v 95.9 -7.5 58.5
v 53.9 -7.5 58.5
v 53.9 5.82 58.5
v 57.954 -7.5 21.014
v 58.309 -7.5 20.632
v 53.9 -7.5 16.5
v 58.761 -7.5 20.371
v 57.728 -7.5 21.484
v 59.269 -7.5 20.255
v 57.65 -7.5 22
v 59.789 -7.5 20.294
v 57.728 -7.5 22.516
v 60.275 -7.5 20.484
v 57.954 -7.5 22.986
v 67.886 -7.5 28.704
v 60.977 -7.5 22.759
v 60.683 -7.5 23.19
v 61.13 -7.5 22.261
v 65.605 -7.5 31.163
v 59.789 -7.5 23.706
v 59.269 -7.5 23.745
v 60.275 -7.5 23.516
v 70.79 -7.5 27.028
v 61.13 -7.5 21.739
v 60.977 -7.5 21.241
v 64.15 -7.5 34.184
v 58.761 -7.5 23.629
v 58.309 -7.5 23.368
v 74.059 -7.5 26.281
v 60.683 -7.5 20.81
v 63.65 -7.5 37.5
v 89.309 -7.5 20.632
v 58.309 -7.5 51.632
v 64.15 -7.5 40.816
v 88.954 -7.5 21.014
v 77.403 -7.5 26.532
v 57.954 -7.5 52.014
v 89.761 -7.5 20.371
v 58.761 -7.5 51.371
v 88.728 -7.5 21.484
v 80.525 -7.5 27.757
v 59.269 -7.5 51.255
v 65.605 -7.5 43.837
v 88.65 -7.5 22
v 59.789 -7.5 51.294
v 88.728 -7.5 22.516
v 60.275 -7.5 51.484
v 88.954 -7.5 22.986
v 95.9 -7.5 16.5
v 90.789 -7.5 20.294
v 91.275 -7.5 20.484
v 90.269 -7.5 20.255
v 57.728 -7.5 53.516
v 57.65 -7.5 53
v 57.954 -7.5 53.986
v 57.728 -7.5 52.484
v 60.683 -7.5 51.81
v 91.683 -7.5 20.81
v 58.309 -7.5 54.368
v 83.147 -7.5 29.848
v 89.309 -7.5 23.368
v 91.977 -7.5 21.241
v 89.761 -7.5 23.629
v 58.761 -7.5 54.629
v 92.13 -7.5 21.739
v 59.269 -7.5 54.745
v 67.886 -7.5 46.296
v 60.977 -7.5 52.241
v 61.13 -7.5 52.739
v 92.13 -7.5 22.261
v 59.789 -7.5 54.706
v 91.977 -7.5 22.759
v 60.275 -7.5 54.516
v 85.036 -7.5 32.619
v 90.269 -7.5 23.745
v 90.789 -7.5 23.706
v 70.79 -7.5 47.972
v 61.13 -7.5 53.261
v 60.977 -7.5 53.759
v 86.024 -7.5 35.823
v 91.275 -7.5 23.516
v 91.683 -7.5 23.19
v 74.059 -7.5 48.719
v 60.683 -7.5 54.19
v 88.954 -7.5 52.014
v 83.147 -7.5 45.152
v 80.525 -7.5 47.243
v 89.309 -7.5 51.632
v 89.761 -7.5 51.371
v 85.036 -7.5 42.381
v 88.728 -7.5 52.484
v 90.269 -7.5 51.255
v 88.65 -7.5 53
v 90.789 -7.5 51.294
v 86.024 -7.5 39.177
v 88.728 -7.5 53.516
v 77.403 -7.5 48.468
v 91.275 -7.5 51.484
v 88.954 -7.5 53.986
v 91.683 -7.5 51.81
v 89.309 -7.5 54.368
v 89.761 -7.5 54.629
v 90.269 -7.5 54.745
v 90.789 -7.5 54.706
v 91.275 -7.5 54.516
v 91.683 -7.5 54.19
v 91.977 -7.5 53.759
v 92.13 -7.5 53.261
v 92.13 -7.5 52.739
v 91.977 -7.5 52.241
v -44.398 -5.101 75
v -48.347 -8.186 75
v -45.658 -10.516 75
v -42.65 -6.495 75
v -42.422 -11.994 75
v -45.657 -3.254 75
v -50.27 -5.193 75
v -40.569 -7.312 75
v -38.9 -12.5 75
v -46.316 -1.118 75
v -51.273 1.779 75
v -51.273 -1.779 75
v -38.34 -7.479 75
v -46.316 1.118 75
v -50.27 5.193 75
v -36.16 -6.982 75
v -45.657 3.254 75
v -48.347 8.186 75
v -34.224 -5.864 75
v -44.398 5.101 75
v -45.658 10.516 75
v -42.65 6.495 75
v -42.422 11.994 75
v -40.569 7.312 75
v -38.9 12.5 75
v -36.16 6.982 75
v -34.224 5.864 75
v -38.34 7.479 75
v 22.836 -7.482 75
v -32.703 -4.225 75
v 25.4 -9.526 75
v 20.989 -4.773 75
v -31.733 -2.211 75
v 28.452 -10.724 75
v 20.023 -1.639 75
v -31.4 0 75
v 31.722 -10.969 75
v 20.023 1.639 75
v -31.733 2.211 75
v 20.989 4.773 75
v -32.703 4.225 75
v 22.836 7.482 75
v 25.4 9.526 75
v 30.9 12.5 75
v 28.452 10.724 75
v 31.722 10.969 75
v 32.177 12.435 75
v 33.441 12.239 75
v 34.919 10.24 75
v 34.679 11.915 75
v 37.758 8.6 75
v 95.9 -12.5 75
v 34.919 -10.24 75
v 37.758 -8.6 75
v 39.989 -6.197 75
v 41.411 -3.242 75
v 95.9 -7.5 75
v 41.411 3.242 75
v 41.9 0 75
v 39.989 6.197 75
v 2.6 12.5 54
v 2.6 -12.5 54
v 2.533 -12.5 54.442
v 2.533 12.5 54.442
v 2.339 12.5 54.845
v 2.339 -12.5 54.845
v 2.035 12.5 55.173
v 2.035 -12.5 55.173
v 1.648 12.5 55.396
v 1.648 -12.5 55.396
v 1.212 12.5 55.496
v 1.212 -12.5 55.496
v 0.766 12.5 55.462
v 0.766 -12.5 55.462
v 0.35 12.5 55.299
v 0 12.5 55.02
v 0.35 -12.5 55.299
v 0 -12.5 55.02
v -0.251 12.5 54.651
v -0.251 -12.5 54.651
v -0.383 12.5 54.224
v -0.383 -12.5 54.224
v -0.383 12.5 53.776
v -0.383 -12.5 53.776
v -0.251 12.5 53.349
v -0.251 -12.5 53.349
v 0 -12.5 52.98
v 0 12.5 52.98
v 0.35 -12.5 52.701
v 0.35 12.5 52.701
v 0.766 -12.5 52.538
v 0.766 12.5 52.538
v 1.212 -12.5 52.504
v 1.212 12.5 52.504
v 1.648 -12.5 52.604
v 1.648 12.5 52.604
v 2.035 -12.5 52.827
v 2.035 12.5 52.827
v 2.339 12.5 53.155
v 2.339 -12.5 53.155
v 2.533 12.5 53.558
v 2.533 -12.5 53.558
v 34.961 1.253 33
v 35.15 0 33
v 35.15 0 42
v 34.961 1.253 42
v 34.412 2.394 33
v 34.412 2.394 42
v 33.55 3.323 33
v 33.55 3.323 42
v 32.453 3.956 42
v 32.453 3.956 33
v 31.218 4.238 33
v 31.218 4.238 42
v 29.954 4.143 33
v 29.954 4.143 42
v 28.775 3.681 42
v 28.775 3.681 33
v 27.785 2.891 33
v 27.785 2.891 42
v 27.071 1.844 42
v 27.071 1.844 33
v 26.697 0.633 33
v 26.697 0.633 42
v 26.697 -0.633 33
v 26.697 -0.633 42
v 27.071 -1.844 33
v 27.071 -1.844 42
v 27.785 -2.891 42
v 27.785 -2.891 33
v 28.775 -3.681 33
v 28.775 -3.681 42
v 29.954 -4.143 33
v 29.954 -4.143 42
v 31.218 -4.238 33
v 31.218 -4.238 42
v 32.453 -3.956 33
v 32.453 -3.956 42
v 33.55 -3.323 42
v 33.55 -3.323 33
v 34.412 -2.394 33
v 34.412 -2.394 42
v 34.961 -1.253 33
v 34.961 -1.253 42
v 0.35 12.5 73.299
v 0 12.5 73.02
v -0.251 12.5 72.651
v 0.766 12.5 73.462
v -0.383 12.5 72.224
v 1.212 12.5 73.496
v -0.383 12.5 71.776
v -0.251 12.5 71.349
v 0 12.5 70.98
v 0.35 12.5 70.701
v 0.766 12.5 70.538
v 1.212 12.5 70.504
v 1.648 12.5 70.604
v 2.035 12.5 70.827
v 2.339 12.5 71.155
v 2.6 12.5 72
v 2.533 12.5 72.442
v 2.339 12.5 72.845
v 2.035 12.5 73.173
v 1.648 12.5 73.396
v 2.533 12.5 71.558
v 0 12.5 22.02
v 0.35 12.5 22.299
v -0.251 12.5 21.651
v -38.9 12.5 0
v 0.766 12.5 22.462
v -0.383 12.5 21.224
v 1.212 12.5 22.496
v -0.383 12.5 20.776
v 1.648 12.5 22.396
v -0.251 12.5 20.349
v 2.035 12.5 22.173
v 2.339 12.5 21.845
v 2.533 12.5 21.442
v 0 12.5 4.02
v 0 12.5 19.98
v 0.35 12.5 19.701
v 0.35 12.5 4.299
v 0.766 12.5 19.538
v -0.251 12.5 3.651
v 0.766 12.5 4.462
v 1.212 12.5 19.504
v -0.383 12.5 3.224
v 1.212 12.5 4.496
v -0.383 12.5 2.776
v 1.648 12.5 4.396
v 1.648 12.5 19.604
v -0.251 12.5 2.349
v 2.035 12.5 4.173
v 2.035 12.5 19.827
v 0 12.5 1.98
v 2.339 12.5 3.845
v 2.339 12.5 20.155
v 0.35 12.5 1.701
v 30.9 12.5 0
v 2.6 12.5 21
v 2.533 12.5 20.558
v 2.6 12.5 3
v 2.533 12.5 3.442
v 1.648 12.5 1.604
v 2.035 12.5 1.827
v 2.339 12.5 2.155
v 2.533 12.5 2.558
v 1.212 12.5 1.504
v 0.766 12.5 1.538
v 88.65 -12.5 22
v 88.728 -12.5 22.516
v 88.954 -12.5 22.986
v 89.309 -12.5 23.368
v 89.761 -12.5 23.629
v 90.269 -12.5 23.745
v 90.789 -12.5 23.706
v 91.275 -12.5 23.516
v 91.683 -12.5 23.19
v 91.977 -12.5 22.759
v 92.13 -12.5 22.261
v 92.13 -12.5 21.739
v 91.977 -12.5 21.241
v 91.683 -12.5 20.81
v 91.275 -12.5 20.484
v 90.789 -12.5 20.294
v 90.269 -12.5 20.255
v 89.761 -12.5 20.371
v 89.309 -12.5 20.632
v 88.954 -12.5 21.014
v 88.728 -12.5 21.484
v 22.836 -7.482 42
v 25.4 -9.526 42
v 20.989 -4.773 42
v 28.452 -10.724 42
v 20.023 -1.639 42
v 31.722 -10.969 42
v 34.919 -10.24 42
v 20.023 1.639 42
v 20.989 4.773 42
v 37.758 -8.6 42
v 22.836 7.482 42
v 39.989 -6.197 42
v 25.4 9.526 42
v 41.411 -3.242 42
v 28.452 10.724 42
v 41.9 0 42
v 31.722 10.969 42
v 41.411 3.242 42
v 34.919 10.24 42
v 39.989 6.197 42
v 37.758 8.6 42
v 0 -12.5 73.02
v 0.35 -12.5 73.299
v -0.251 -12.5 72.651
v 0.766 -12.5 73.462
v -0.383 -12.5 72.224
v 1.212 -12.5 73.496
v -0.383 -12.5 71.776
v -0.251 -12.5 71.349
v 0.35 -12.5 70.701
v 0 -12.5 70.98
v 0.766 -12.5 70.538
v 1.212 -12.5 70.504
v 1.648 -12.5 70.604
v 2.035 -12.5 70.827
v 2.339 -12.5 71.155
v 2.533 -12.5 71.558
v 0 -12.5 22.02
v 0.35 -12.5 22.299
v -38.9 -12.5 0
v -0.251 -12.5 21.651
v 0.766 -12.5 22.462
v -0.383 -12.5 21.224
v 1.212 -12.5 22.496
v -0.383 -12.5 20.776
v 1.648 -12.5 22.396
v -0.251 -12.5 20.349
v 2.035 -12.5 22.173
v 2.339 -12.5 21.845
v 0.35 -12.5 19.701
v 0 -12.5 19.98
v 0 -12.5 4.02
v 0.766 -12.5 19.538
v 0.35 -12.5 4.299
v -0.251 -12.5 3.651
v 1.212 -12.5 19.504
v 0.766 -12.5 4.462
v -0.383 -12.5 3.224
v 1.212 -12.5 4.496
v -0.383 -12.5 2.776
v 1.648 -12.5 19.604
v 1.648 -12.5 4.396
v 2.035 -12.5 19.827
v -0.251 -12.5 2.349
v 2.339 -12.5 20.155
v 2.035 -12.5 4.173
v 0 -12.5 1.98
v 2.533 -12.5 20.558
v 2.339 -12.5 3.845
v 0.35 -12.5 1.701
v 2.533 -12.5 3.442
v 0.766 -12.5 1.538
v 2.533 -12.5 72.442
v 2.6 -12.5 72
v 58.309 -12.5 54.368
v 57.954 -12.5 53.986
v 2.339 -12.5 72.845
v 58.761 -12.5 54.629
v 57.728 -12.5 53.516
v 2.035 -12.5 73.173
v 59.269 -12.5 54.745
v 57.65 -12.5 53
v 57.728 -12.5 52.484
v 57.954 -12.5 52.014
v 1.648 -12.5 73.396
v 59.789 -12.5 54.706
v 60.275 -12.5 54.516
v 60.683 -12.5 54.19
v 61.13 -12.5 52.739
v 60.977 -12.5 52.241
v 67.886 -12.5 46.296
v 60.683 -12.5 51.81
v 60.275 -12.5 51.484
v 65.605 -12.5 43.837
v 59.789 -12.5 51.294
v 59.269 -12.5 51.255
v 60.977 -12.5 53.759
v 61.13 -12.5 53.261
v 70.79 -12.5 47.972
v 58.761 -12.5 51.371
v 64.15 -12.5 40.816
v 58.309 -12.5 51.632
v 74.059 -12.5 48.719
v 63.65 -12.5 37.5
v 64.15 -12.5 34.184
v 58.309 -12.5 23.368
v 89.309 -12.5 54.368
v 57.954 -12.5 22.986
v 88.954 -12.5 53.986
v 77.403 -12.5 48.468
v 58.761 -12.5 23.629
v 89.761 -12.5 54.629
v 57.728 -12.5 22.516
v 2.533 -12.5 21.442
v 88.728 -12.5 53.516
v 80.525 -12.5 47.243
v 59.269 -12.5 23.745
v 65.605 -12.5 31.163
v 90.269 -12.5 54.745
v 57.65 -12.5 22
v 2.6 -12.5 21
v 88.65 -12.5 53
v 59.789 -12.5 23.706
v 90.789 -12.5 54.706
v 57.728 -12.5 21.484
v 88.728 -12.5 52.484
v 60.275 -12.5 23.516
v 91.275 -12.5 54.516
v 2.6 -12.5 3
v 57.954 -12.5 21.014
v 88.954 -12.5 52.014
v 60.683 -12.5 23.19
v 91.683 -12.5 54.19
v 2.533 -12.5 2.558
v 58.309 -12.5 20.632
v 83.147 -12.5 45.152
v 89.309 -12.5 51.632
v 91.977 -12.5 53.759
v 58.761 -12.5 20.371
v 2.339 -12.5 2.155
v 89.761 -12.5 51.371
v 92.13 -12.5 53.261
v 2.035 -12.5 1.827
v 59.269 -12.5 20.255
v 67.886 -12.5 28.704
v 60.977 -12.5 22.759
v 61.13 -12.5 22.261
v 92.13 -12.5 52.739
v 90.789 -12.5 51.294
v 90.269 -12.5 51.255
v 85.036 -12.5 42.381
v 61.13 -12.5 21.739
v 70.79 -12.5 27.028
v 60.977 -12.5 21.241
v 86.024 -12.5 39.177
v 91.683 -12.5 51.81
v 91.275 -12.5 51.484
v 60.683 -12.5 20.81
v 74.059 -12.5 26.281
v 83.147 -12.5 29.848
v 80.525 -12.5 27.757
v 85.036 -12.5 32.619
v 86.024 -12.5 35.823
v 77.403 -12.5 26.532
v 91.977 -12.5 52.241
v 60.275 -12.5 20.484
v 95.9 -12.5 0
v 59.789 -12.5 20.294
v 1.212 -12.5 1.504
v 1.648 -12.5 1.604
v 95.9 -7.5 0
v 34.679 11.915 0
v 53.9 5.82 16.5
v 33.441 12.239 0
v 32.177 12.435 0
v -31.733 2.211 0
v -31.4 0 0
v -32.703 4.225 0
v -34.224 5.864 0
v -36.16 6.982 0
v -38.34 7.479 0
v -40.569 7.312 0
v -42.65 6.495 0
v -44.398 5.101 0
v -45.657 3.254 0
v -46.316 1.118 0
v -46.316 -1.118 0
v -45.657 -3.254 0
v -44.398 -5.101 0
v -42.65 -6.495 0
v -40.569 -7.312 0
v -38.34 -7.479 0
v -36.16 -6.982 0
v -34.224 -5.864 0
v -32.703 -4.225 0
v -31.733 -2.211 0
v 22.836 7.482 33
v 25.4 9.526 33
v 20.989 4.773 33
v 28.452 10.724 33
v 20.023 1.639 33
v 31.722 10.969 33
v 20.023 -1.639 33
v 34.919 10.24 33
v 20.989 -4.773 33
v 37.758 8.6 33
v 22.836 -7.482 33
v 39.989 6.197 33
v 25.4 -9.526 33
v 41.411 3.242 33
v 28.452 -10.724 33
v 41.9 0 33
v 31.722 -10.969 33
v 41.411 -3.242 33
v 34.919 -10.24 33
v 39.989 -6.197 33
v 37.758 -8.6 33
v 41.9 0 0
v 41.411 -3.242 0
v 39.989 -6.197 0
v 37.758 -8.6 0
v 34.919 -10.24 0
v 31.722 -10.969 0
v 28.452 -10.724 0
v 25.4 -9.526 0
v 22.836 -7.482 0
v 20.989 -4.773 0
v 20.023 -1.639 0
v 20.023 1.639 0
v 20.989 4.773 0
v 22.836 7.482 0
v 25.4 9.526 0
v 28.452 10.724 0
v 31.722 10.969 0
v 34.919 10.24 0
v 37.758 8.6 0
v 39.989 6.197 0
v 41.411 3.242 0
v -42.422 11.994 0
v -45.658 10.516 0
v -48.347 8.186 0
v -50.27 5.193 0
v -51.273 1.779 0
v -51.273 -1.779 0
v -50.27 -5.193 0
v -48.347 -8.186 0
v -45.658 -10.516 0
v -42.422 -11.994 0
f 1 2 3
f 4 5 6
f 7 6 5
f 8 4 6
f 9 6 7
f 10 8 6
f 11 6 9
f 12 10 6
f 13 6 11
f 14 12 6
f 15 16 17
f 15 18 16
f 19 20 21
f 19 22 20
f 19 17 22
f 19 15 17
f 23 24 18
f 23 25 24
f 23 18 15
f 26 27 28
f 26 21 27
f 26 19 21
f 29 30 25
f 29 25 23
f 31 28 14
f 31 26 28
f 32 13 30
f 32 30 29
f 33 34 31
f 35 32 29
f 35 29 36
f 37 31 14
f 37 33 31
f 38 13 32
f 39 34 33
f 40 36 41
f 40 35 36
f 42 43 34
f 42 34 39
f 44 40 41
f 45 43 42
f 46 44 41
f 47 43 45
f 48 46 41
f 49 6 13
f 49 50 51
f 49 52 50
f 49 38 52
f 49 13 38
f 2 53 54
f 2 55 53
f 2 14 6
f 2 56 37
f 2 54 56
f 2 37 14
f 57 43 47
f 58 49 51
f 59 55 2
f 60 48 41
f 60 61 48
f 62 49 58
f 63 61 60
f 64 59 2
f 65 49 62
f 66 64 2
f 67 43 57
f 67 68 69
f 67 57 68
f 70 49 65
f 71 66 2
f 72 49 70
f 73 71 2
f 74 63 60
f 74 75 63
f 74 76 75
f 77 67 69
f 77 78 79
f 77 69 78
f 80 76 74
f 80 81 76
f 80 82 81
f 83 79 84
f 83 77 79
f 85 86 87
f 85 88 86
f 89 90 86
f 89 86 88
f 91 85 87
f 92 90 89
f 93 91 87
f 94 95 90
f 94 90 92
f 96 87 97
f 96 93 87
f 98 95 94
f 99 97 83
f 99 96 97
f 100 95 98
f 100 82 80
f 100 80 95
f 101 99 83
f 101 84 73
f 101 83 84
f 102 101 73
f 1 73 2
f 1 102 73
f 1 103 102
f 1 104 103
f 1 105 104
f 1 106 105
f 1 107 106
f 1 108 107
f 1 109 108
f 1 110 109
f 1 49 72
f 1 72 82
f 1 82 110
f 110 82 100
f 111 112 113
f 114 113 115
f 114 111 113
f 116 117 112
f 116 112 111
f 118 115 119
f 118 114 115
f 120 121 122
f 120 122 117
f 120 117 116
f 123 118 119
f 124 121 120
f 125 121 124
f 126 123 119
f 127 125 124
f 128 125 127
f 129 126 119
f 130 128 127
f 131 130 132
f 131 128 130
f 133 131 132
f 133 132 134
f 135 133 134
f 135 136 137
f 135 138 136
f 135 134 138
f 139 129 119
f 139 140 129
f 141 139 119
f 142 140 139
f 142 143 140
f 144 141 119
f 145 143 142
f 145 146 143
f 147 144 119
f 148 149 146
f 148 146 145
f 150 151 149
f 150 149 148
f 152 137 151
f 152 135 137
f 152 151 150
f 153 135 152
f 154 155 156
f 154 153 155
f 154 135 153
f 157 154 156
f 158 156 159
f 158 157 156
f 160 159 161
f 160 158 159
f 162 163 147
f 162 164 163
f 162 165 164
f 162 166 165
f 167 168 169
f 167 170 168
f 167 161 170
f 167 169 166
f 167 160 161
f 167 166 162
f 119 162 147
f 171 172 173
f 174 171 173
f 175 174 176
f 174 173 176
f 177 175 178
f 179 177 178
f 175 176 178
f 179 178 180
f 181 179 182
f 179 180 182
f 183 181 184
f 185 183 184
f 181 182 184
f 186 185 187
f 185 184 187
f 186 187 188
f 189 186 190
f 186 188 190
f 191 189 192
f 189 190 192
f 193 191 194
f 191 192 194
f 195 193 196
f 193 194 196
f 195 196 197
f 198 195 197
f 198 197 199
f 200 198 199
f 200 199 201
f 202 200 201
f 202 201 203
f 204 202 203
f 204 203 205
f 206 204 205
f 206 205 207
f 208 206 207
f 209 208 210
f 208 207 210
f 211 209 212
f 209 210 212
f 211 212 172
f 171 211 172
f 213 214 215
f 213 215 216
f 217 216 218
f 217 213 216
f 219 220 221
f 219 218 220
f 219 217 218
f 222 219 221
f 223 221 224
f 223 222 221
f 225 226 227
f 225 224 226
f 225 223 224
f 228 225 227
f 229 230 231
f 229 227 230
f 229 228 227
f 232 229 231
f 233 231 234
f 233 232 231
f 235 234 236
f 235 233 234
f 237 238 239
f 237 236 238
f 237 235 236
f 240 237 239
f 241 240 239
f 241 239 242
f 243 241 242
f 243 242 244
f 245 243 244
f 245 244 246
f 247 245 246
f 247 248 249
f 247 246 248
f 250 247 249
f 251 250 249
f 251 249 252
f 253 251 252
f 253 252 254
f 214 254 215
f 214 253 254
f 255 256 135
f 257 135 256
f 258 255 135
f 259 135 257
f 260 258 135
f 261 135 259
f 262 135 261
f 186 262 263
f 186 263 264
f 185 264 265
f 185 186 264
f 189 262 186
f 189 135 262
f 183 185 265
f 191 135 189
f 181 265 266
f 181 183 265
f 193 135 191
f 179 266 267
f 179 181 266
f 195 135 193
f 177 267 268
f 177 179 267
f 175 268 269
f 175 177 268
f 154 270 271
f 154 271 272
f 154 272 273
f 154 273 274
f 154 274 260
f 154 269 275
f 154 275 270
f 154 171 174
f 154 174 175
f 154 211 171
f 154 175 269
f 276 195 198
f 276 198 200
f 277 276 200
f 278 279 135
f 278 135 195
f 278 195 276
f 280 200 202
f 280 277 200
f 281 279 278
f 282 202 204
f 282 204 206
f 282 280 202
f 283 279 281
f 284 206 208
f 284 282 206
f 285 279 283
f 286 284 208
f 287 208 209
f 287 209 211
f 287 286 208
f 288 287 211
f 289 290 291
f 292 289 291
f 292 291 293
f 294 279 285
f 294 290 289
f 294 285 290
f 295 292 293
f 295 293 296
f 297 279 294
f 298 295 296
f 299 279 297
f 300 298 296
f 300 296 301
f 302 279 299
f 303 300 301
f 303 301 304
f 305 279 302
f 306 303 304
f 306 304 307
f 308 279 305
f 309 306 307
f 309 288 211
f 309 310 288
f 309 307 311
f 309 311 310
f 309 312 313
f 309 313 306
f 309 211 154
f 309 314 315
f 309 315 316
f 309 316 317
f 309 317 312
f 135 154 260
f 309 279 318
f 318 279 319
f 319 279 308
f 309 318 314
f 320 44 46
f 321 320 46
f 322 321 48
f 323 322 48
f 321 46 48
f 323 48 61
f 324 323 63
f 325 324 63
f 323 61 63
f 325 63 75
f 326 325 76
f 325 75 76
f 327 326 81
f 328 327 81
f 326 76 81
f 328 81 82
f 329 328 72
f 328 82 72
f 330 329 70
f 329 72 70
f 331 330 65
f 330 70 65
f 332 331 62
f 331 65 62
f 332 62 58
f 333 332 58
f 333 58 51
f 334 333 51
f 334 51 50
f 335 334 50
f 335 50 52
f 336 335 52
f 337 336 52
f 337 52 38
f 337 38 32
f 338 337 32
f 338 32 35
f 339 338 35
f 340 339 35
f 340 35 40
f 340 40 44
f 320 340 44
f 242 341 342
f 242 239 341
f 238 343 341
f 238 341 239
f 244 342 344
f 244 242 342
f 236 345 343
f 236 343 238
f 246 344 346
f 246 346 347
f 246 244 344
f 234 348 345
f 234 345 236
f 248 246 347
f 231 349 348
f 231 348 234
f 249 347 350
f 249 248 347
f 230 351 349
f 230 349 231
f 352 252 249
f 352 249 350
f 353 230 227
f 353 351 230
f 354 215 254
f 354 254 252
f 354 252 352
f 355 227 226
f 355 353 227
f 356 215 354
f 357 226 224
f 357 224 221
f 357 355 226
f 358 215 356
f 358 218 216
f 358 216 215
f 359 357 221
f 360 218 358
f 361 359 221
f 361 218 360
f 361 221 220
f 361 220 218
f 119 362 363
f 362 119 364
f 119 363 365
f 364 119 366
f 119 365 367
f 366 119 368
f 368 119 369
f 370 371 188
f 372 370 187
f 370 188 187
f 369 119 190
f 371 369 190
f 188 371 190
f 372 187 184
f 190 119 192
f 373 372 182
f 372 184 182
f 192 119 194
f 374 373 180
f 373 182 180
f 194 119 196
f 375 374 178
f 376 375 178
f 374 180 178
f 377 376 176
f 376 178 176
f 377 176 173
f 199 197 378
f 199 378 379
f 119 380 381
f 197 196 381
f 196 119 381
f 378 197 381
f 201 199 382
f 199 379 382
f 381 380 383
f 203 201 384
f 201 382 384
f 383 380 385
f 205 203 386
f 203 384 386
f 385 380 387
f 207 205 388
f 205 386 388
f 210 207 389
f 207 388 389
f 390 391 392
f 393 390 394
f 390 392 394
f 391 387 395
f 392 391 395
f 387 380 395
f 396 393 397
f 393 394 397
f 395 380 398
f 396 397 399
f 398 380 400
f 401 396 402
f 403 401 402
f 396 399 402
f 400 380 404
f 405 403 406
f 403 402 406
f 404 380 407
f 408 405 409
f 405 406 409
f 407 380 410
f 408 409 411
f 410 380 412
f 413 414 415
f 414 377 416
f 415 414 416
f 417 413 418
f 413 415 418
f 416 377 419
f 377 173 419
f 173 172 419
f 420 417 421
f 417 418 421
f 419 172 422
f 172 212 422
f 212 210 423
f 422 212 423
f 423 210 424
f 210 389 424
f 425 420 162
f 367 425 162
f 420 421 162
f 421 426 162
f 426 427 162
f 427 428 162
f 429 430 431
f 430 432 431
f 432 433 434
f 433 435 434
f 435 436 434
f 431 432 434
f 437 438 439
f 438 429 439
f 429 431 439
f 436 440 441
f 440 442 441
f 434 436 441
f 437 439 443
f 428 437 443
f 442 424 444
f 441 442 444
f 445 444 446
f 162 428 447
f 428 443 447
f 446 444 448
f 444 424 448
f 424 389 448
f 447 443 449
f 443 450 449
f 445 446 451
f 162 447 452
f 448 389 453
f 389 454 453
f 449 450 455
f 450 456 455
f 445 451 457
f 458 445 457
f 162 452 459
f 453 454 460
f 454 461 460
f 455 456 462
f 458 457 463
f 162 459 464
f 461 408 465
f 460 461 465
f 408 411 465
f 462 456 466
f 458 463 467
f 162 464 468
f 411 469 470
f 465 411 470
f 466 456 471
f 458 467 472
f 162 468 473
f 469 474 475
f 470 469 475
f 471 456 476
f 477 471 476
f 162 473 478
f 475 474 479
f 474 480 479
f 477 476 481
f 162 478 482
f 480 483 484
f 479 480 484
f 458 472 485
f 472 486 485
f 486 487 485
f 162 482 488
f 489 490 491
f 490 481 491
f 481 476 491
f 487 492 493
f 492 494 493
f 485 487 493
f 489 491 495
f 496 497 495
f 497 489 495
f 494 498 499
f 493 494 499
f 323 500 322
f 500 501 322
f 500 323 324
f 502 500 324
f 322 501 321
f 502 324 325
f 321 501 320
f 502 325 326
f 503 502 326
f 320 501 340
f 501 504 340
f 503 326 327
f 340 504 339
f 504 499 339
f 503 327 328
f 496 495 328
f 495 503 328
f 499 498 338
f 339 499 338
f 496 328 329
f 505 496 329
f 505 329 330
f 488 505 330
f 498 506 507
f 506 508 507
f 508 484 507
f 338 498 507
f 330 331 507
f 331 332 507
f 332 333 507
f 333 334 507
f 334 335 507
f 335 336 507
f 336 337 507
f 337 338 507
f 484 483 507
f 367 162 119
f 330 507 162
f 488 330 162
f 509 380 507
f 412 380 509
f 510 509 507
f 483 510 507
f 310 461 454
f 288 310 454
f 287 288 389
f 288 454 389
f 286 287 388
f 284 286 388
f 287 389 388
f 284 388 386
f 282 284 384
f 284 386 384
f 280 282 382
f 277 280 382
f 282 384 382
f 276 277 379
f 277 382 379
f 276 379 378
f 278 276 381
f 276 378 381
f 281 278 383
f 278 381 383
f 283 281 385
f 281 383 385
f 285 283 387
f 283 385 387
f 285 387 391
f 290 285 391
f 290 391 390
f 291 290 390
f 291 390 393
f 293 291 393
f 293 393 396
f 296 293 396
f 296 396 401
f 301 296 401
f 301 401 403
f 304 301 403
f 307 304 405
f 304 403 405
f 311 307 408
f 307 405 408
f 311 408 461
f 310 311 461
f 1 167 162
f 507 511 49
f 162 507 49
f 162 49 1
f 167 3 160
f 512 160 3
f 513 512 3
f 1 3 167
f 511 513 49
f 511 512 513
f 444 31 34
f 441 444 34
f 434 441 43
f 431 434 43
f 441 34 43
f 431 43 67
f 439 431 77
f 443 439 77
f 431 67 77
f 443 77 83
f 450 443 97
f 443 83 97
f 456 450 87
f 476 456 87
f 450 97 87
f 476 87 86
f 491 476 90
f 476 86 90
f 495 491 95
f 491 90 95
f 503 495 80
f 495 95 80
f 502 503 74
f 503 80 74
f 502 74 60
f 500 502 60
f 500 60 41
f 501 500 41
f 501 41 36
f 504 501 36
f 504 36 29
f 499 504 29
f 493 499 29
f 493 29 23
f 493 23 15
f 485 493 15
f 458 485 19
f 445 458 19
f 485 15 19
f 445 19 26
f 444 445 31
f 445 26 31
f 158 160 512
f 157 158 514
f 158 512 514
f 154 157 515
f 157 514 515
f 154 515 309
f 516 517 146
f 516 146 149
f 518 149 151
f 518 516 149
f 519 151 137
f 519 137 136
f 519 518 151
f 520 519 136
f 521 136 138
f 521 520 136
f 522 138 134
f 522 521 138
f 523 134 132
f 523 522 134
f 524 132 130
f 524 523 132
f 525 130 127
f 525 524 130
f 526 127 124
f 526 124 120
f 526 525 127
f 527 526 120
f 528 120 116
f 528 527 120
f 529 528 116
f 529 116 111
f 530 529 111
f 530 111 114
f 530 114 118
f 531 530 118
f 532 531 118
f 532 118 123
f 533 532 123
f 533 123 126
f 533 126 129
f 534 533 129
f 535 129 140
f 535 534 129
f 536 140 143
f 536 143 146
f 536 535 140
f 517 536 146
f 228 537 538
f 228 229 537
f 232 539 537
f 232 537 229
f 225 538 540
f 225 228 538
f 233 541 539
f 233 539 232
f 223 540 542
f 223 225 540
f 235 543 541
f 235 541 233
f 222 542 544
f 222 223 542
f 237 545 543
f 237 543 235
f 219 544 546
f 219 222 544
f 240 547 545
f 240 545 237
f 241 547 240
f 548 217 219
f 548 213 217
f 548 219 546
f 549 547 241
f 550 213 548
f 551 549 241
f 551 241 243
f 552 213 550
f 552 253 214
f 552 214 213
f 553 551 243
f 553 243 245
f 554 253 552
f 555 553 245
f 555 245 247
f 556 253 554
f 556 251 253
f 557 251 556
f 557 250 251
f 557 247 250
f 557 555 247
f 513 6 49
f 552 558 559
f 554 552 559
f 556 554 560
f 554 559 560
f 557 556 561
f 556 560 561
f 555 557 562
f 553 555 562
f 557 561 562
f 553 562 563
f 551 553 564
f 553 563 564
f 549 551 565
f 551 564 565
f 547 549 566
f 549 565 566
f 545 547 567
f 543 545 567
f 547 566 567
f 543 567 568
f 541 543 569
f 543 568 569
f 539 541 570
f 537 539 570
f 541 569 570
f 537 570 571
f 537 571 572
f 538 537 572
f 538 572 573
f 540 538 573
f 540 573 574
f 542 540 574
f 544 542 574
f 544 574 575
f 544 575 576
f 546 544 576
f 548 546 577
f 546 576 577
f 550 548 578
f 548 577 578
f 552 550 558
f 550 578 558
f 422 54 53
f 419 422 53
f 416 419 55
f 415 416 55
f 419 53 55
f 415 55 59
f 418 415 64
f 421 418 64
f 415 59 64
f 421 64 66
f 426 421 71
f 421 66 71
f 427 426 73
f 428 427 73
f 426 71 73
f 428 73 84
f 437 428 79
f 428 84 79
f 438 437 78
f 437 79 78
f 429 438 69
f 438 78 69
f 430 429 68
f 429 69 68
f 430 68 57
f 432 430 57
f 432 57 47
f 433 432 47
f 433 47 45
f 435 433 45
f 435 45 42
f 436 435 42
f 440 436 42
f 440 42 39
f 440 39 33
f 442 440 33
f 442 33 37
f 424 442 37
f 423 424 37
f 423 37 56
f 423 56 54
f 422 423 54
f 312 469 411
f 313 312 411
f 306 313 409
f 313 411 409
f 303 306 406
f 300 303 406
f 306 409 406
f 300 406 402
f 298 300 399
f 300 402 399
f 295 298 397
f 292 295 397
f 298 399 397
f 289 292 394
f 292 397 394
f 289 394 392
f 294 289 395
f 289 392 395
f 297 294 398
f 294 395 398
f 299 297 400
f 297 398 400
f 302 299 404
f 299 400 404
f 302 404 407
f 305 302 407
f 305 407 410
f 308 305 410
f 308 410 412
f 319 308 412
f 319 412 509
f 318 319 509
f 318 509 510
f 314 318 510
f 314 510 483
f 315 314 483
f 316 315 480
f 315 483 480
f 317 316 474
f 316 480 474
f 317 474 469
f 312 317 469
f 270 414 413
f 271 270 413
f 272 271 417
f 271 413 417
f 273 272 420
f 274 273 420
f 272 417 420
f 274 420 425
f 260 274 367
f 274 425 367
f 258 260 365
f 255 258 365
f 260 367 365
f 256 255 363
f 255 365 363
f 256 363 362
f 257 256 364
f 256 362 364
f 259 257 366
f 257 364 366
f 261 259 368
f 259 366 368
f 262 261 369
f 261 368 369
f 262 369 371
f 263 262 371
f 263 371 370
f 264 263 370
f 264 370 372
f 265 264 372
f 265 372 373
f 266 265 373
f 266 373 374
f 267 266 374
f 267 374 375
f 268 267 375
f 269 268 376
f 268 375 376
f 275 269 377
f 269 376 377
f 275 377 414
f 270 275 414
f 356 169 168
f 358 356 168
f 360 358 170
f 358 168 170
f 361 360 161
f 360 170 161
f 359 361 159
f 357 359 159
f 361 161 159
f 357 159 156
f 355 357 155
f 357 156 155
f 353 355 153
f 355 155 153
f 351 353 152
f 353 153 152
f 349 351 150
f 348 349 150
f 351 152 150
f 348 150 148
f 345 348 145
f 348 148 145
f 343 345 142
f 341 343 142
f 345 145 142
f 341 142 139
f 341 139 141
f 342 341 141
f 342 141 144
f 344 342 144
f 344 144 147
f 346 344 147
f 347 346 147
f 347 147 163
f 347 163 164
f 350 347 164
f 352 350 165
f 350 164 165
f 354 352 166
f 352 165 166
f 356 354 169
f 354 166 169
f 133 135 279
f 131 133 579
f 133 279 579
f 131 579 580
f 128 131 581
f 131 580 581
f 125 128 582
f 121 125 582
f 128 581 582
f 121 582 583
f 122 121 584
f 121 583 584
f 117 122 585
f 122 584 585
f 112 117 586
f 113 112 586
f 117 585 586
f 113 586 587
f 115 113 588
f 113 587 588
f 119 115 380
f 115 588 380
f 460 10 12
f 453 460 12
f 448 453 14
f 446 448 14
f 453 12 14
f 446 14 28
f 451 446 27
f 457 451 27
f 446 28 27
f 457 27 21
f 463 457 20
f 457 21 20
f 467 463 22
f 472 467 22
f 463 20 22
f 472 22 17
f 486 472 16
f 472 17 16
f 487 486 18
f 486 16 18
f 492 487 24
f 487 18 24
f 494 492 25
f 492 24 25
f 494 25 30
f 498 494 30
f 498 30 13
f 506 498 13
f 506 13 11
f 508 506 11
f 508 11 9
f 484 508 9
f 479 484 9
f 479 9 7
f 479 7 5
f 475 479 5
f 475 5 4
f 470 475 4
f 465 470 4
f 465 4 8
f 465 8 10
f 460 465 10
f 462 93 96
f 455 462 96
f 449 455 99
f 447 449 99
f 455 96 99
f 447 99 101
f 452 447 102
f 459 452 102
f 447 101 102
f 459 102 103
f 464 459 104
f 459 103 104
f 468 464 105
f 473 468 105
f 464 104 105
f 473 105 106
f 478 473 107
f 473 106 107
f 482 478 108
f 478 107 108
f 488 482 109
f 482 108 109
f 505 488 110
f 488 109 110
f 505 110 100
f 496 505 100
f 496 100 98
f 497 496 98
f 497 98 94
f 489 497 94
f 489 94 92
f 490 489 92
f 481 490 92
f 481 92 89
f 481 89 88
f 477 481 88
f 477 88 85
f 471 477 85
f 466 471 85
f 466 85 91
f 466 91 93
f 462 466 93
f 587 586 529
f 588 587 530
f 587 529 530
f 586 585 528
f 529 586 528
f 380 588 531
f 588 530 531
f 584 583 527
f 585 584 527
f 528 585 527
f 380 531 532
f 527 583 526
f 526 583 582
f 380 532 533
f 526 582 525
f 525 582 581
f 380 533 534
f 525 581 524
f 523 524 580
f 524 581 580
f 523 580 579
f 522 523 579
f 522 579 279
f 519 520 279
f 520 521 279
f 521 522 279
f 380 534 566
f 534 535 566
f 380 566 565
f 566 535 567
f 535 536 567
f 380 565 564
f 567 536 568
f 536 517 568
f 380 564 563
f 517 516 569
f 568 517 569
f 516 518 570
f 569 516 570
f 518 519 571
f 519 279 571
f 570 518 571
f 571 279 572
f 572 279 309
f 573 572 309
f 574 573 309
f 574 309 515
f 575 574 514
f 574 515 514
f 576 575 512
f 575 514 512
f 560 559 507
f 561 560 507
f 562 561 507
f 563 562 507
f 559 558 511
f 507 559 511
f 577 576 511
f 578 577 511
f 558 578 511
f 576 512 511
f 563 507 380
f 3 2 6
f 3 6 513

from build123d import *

# Parameters (mm, degrees)
SKETCH_R        = 7.5
SKETCH_R_2      = 4.25
PAD_DEPTH       = 75
SKETCH001_W     = 19.415184
SKETCH001_H     = 42
POCKET_DEPTH    = 42
SKETCH002_R     = 11.25
POCKET001_DEPTH = 5
SKETCH003_R     = 1.75
HOLE_DEPTH      = 25
SKETCH004_R     = 1.5
HOLE001_DEPTH   = 25
HOLE001_TIPS_R  = 1.5
SKETCH005_R     = 11
POCKET002_DEPTH = 33
SKETCH006_R     = 11
POCKET003_DEPTH = 33


with BuildPart() as part:
    # Sketch → Pad (new body)
    with BuildSketch(Plane.XY):
        with BuildLine():
            ThreePointArc((-38.9, 12.5), (-51.4, 0), (-38.9, -12.5))
            Line((-38.9, -12.5), (30.9, -12.5))
            Line((95.9, -12.5), (30.9, -12.5))
            Line((95.9, -7.5), (95.9, -12.5))
            Line((34.678675, 11.915184), (95.9, -7.5))
            ThreePointArc((34.678675, 11.915184), (32.811831, 12.352931), (30.9, 12.5))
            Line((-38.9, 12.5), (30.9, 12.5))
        make_face()
        with Locations((-38.9, 0)):
            Circle(SKETCH_R, mode=Mode.SUBTRACT)
        with Locations((30.9, 0)):
            Circle(SKETCH_R_2, mode=Mode.SUBTRACT)
    extrude(amount=PAD_DEPTH)

    # Sketch001 (on Face3 of Pad) → Pocket (cut)
    with BuildSketch(Plane.YZ.offset(95.9)):
        with Locations((2.207592, 37.5)):
            Rectangle(SKETCH001_W, SKETCH001_H)
    extrude(amount=-POCKET_DEPTH, mode=Mode.SUBTRACT)

    # Sketch002 (on Face11 of Pocket) → Pocket001 (cut)
    with BuildSketch(Plane(origin=(0, -7.5, 0), x_dir=(-1, 0, 0), z_dir=(0, 1, 0))):
        with Locations((-74.9, 37.5)):
            Circle(SKETCH002_R)
    extrude(amount=-POCKET001_DEPTH, mode=Mode.SUBTRACT)

    # Sketch003 (on Face12 of Pocket001) → Hole (cut)
    with BuildSketch(Plane(origin=(0, -7.5, 0), x_dir=(-1, 0, 0), z_dir=(0, 1, 0))):
        with Locations((-90.4, 53)):
            Circle(SKETCH003_R)
        with Locations((-59.4, 53)):
            Circle(SKETCH003_R)
        with Locations((-59.4, 22)):
            Circle(SKETCH003_R)
        with Locations((-90.4, 22)):
            Circle(SKETCH003_R)
    extrude(amount=-HOLE_DEPTH, mode=Mode.SUBTRACT)

    # Sketch004 (on Face3 of Hole) → Hole001 (cut)
    with BuildSketch(Plane.XZ.offset(12.5)):
        with Locations((1.1, 72)):
            Circle(SKETCH004_R)
        with Locations((1.1, 54)):
            Circle(SKETCH004_R)
        with Locations((1.1, 21)):
            Circle(SKETCH004_R)
        with Locations((1.1, 3)):
            Circle(SKETCH004_R)
    extrude(amount=-HOLE001_DEPTH, mode=Mode.SUBTRACT)

    # Hole001 tips → Hole001 tip 1 section 0
    with BuildSketch(Plane.XZ.offset(-12.5), mode=Mode.PRIVATE) as hole001_tip_1_s0:
        with Locations((1.1, 72)):
            Circle(HOLE001_TIPS_R)
    loft([hole001_tip_1_s0.sketch, Vertex(1.1, 13.401291, 72)], mode=Mode.SUBTRACT)

    # Hole001 tips → Hole001 tip 2 section 0
    with BuildSketch(Plane.XZ.offset(-12.5), mode=Mode.PRIVATE) as hole001_tip_2_s0:
        with Locations((1.1, 54)):
            Circle(HOLE001_TIPS_R)
    loft([hole001_tip_2_s0.sketch, Vertex(1.1, 13.401291, 54)], mode=Mode.SUBTRACT)

    # Hole001 tips → Hole001 tip 3 section 0
    with BuildSketch(Plane.XZ.offset(-12.5), mode=Mode.PRIVATE) as hole001_tip_3_s0:
        with Locations((1.1, 21)):
            Circle(HOLE001_TIPS_R)
    loft([hole001_tip_3_s0.sketch, Vertex(1.1, 13.401291, 21)], mode=Mode.SUBTRACT)

    # Hole001 tips → Hole001 tip 4 section 0
    with BuildSketch(Plane.XZ.offset(-12.5), mode=Mode.PRIVATE) as hole001_tip_4_s0:
        with Locations((1.1, 3)):
            Circle(HOLE001_TIPS_R)
    loft([hole001_tip_4_s0.sketch, Vertex(1.1, 13.401291, 3)], mode=Mode.SUBTRACT)

    # Sketch005 (on Face5 of Hole001) → Pocket002 (cut)
    with BuildSketch(Plane.XY.offset(75)):
        with Locations((30.9, 0)):
            Circle(SKETCH005_R)
    extrude(amount=-POCKET002_DEPTH, mode=Mode.SUBTRACT)

    # Sketch006 (on Face4 of Pocket002) → Pocket003 (cut)
    with BuildSketch(Plane(origin=(0, 0, 0), x_dir=(1, 0, 0), z_dir=(0, 0, -1))):
        with Locations((30.9, 0)):
            Circle(SKETCH006_R)
    extrude(amount=-POCKET003_DEPTH, mode=Mode.SUBTRACT)


solid = part.part
